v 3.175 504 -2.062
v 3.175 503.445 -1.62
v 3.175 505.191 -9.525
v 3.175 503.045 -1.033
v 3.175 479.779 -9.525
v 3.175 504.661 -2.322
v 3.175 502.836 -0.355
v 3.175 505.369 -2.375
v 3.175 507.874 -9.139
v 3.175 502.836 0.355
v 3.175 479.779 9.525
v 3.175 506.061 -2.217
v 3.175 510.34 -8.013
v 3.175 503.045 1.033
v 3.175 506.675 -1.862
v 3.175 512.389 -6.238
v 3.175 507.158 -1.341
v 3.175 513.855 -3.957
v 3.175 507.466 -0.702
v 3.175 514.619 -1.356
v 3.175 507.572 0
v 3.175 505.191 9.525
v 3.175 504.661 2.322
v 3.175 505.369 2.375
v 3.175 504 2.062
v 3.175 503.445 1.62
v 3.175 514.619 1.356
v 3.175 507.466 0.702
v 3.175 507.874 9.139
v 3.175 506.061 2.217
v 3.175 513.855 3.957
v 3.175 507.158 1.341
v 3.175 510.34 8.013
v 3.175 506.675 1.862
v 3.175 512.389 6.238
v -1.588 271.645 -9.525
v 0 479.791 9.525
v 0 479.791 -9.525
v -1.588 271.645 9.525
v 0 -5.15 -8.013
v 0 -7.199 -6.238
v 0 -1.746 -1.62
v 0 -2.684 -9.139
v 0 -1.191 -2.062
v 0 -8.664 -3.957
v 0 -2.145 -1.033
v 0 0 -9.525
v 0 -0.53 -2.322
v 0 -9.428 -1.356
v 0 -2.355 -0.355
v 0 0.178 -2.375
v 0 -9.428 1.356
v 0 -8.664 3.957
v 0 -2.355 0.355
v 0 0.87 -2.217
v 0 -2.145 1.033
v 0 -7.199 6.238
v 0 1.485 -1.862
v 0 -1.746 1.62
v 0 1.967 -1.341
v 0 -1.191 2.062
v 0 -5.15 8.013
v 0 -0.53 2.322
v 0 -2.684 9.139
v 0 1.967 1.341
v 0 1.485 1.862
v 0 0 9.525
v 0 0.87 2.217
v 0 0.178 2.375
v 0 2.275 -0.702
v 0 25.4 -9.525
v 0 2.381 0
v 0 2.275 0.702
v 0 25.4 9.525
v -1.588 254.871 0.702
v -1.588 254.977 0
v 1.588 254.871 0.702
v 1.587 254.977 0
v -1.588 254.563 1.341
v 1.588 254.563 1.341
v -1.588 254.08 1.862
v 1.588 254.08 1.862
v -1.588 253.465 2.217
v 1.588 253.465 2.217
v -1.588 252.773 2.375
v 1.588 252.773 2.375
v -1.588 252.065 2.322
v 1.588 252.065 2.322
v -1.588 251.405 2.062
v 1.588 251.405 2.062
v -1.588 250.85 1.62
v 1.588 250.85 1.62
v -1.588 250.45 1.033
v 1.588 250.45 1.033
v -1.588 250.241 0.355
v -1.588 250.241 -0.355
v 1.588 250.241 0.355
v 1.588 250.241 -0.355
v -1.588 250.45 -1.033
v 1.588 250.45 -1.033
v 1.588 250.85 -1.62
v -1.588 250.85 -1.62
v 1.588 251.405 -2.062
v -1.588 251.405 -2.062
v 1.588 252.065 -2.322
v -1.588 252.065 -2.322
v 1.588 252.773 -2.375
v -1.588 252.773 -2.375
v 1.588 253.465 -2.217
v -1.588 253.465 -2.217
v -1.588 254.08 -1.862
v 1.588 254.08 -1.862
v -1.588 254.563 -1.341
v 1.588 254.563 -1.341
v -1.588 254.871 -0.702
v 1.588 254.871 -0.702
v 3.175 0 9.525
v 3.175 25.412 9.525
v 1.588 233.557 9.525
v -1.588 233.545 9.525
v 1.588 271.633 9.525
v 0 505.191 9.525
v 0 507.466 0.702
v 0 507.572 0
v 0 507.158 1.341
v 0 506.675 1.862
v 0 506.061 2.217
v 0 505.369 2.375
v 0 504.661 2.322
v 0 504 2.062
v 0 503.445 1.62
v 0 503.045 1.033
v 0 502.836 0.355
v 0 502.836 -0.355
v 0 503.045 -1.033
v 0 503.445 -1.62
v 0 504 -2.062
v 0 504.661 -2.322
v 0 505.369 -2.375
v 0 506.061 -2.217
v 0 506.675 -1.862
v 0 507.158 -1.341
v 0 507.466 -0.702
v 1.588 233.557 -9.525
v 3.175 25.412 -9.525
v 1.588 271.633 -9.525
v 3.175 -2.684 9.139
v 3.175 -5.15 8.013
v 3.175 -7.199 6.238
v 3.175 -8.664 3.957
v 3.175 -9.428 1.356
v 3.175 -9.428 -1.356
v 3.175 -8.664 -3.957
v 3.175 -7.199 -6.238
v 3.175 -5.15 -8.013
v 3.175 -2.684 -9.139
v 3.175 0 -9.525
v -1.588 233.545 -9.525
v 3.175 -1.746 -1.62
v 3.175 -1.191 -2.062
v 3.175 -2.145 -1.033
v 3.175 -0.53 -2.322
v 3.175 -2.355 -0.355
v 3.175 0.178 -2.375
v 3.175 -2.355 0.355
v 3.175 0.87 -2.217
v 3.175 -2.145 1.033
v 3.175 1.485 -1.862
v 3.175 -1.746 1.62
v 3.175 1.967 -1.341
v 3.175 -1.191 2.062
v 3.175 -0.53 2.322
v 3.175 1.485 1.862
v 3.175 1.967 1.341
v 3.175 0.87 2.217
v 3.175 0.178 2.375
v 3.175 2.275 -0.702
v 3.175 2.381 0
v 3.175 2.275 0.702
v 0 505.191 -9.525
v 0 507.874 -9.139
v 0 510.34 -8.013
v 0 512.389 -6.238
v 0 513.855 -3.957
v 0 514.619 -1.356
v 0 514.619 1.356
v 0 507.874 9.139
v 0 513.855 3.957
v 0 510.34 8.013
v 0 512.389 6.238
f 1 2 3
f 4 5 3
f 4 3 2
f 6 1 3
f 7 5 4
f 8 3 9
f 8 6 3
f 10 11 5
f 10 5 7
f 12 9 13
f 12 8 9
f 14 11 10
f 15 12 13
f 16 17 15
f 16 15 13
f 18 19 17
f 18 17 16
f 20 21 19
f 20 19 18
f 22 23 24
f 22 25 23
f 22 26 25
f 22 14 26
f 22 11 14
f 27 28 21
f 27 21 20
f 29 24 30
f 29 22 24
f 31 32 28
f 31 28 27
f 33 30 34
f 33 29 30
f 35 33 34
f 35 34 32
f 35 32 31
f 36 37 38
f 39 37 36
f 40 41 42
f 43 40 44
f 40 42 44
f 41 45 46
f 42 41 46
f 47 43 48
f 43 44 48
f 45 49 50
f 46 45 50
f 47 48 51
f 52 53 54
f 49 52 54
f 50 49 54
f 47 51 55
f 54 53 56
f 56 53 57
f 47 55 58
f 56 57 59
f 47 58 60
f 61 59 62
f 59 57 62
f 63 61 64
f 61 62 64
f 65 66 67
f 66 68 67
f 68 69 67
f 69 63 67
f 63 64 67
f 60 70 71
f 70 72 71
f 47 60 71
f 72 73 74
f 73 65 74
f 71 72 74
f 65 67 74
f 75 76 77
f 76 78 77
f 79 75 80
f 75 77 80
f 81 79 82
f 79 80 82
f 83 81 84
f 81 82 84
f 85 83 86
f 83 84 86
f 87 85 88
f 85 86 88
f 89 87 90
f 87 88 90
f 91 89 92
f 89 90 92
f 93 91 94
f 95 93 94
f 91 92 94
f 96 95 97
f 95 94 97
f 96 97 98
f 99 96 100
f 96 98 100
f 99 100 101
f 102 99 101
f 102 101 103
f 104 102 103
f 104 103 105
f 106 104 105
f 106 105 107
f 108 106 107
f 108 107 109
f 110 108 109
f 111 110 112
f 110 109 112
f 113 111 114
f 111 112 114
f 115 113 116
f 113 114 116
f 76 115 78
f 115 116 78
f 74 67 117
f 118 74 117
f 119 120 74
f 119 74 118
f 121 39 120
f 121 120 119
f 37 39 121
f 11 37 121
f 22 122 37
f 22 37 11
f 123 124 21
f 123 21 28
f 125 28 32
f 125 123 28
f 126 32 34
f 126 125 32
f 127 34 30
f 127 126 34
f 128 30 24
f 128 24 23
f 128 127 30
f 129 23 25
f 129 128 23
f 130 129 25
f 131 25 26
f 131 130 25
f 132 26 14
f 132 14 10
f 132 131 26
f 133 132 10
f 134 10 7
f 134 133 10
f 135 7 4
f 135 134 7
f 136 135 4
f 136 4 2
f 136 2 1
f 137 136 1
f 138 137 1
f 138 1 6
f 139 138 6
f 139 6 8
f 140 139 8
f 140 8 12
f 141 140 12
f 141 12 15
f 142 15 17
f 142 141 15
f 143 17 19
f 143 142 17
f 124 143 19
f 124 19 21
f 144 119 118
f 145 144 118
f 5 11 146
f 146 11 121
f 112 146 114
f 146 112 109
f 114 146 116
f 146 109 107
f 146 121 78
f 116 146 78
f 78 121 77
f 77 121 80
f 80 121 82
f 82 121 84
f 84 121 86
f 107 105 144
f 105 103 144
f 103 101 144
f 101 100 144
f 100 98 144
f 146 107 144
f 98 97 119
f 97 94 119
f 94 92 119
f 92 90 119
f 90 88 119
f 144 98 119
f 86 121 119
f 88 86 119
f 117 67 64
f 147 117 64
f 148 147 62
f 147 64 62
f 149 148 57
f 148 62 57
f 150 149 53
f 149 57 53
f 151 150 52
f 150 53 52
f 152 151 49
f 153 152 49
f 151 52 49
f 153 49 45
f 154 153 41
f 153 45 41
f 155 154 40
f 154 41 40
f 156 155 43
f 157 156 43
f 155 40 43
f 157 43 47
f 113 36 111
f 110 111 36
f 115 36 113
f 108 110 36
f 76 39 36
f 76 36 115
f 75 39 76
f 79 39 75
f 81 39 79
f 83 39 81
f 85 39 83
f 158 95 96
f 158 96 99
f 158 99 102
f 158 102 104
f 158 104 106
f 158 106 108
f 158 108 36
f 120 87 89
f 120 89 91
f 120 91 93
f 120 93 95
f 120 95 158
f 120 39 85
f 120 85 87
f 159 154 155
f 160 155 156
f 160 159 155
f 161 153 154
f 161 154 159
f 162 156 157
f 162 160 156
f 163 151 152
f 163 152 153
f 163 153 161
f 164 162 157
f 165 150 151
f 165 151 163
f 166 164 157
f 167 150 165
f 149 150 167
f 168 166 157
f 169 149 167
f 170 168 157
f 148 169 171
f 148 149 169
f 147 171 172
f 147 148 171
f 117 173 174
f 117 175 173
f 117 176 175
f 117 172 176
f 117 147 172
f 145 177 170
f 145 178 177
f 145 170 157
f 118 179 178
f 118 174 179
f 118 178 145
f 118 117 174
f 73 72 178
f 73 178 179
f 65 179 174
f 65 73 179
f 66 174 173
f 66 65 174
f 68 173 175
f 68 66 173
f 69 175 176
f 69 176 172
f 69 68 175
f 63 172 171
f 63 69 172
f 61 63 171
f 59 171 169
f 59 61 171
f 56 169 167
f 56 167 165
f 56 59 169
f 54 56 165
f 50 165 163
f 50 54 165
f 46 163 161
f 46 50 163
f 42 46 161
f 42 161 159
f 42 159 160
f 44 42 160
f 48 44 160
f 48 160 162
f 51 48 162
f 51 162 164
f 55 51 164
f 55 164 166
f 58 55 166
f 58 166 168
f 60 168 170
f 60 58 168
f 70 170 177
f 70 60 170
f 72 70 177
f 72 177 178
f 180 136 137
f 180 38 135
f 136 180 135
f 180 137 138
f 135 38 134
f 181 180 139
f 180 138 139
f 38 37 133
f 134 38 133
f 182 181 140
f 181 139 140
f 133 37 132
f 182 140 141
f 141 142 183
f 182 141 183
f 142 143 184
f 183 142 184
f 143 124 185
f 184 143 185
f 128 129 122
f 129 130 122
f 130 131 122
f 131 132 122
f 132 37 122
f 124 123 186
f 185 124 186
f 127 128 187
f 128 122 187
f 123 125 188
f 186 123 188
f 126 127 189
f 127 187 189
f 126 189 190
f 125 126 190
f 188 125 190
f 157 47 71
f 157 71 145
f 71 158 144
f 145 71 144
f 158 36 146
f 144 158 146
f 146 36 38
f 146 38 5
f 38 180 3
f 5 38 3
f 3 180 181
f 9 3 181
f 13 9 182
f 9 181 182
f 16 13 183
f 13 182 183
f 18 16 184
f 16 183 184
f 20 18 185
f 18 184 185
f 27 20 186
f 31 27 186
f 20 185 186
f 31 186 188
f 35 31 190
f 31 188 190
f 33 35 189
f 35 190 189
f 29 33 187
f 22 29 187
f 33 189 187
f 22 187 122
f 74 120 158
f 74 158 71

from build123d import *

# Parameters (mm, degrees)
F0_R     = 2.38125
F1_DEPTH = 3.175
F3_DEPTH = 19.05
F5_DEPTH = 25.4
F6_R     = 2.38125
F7_DEPTH = 25.4


with BuildPart() as f1:
    # F0 (on Right) → F1 (new body)
    with BuildSketch(Plane.YZ):
        with BuildLine():
            Line((505.190684, 9.525), (0, 9.525))
            ThreePointArc((0, 9.525), (-9.525, 0), (0, -9.525))
            Line((0, -9.525), (505.190684, -9.525))
            ThreePointArc((505.190684, -9.525), (514.715684, 0), (505.190684, 9.525))
        make_face()
        Circle(F0_R, mode=Mode.SUBTRACT)
        with Locations((252.595342, 0)):
            Circle(F0_R, mode=Mode.SUBTRACT)
        with Locations((505.190684, 0)):
            Circle(F0_R, mode=Mode.SUBTRACT)
    extrude(amount=F1_DEPTH)

    # F2 (on face) → F3 (join)
    with BuildSketch(Plane.XY.offset(9.525)):
        Polygon((-1.5875, 233.545342), (0, 25.4), (0, 479.790684), (-1.5875, 271.645342), align=None)
    extrude(amount=-F3_DEPTH)

    # F4 (on face) → F5 (cut)
    with BuildSketch(Plane.XY.offset(9.525)):
        Polygon((1.5875, 233.557449), (3.175, 25.412107), (3.175, 479.778576), (1.5875, 271.633234), align=None)
    extrude(amount=-F5_DEPTH, mode=Mode.SUBTRACT)

    # F6 (on face) → F7 (cut)
    with BuildSketch(Plane.YZ.offset(1.5875)):
        with Locations((252.595342, 0)):
            Circle(F6_R)
    extrude(amount=-F7_DEPTH, mode=Mode.SUBTRACT)


solid = f1.part
